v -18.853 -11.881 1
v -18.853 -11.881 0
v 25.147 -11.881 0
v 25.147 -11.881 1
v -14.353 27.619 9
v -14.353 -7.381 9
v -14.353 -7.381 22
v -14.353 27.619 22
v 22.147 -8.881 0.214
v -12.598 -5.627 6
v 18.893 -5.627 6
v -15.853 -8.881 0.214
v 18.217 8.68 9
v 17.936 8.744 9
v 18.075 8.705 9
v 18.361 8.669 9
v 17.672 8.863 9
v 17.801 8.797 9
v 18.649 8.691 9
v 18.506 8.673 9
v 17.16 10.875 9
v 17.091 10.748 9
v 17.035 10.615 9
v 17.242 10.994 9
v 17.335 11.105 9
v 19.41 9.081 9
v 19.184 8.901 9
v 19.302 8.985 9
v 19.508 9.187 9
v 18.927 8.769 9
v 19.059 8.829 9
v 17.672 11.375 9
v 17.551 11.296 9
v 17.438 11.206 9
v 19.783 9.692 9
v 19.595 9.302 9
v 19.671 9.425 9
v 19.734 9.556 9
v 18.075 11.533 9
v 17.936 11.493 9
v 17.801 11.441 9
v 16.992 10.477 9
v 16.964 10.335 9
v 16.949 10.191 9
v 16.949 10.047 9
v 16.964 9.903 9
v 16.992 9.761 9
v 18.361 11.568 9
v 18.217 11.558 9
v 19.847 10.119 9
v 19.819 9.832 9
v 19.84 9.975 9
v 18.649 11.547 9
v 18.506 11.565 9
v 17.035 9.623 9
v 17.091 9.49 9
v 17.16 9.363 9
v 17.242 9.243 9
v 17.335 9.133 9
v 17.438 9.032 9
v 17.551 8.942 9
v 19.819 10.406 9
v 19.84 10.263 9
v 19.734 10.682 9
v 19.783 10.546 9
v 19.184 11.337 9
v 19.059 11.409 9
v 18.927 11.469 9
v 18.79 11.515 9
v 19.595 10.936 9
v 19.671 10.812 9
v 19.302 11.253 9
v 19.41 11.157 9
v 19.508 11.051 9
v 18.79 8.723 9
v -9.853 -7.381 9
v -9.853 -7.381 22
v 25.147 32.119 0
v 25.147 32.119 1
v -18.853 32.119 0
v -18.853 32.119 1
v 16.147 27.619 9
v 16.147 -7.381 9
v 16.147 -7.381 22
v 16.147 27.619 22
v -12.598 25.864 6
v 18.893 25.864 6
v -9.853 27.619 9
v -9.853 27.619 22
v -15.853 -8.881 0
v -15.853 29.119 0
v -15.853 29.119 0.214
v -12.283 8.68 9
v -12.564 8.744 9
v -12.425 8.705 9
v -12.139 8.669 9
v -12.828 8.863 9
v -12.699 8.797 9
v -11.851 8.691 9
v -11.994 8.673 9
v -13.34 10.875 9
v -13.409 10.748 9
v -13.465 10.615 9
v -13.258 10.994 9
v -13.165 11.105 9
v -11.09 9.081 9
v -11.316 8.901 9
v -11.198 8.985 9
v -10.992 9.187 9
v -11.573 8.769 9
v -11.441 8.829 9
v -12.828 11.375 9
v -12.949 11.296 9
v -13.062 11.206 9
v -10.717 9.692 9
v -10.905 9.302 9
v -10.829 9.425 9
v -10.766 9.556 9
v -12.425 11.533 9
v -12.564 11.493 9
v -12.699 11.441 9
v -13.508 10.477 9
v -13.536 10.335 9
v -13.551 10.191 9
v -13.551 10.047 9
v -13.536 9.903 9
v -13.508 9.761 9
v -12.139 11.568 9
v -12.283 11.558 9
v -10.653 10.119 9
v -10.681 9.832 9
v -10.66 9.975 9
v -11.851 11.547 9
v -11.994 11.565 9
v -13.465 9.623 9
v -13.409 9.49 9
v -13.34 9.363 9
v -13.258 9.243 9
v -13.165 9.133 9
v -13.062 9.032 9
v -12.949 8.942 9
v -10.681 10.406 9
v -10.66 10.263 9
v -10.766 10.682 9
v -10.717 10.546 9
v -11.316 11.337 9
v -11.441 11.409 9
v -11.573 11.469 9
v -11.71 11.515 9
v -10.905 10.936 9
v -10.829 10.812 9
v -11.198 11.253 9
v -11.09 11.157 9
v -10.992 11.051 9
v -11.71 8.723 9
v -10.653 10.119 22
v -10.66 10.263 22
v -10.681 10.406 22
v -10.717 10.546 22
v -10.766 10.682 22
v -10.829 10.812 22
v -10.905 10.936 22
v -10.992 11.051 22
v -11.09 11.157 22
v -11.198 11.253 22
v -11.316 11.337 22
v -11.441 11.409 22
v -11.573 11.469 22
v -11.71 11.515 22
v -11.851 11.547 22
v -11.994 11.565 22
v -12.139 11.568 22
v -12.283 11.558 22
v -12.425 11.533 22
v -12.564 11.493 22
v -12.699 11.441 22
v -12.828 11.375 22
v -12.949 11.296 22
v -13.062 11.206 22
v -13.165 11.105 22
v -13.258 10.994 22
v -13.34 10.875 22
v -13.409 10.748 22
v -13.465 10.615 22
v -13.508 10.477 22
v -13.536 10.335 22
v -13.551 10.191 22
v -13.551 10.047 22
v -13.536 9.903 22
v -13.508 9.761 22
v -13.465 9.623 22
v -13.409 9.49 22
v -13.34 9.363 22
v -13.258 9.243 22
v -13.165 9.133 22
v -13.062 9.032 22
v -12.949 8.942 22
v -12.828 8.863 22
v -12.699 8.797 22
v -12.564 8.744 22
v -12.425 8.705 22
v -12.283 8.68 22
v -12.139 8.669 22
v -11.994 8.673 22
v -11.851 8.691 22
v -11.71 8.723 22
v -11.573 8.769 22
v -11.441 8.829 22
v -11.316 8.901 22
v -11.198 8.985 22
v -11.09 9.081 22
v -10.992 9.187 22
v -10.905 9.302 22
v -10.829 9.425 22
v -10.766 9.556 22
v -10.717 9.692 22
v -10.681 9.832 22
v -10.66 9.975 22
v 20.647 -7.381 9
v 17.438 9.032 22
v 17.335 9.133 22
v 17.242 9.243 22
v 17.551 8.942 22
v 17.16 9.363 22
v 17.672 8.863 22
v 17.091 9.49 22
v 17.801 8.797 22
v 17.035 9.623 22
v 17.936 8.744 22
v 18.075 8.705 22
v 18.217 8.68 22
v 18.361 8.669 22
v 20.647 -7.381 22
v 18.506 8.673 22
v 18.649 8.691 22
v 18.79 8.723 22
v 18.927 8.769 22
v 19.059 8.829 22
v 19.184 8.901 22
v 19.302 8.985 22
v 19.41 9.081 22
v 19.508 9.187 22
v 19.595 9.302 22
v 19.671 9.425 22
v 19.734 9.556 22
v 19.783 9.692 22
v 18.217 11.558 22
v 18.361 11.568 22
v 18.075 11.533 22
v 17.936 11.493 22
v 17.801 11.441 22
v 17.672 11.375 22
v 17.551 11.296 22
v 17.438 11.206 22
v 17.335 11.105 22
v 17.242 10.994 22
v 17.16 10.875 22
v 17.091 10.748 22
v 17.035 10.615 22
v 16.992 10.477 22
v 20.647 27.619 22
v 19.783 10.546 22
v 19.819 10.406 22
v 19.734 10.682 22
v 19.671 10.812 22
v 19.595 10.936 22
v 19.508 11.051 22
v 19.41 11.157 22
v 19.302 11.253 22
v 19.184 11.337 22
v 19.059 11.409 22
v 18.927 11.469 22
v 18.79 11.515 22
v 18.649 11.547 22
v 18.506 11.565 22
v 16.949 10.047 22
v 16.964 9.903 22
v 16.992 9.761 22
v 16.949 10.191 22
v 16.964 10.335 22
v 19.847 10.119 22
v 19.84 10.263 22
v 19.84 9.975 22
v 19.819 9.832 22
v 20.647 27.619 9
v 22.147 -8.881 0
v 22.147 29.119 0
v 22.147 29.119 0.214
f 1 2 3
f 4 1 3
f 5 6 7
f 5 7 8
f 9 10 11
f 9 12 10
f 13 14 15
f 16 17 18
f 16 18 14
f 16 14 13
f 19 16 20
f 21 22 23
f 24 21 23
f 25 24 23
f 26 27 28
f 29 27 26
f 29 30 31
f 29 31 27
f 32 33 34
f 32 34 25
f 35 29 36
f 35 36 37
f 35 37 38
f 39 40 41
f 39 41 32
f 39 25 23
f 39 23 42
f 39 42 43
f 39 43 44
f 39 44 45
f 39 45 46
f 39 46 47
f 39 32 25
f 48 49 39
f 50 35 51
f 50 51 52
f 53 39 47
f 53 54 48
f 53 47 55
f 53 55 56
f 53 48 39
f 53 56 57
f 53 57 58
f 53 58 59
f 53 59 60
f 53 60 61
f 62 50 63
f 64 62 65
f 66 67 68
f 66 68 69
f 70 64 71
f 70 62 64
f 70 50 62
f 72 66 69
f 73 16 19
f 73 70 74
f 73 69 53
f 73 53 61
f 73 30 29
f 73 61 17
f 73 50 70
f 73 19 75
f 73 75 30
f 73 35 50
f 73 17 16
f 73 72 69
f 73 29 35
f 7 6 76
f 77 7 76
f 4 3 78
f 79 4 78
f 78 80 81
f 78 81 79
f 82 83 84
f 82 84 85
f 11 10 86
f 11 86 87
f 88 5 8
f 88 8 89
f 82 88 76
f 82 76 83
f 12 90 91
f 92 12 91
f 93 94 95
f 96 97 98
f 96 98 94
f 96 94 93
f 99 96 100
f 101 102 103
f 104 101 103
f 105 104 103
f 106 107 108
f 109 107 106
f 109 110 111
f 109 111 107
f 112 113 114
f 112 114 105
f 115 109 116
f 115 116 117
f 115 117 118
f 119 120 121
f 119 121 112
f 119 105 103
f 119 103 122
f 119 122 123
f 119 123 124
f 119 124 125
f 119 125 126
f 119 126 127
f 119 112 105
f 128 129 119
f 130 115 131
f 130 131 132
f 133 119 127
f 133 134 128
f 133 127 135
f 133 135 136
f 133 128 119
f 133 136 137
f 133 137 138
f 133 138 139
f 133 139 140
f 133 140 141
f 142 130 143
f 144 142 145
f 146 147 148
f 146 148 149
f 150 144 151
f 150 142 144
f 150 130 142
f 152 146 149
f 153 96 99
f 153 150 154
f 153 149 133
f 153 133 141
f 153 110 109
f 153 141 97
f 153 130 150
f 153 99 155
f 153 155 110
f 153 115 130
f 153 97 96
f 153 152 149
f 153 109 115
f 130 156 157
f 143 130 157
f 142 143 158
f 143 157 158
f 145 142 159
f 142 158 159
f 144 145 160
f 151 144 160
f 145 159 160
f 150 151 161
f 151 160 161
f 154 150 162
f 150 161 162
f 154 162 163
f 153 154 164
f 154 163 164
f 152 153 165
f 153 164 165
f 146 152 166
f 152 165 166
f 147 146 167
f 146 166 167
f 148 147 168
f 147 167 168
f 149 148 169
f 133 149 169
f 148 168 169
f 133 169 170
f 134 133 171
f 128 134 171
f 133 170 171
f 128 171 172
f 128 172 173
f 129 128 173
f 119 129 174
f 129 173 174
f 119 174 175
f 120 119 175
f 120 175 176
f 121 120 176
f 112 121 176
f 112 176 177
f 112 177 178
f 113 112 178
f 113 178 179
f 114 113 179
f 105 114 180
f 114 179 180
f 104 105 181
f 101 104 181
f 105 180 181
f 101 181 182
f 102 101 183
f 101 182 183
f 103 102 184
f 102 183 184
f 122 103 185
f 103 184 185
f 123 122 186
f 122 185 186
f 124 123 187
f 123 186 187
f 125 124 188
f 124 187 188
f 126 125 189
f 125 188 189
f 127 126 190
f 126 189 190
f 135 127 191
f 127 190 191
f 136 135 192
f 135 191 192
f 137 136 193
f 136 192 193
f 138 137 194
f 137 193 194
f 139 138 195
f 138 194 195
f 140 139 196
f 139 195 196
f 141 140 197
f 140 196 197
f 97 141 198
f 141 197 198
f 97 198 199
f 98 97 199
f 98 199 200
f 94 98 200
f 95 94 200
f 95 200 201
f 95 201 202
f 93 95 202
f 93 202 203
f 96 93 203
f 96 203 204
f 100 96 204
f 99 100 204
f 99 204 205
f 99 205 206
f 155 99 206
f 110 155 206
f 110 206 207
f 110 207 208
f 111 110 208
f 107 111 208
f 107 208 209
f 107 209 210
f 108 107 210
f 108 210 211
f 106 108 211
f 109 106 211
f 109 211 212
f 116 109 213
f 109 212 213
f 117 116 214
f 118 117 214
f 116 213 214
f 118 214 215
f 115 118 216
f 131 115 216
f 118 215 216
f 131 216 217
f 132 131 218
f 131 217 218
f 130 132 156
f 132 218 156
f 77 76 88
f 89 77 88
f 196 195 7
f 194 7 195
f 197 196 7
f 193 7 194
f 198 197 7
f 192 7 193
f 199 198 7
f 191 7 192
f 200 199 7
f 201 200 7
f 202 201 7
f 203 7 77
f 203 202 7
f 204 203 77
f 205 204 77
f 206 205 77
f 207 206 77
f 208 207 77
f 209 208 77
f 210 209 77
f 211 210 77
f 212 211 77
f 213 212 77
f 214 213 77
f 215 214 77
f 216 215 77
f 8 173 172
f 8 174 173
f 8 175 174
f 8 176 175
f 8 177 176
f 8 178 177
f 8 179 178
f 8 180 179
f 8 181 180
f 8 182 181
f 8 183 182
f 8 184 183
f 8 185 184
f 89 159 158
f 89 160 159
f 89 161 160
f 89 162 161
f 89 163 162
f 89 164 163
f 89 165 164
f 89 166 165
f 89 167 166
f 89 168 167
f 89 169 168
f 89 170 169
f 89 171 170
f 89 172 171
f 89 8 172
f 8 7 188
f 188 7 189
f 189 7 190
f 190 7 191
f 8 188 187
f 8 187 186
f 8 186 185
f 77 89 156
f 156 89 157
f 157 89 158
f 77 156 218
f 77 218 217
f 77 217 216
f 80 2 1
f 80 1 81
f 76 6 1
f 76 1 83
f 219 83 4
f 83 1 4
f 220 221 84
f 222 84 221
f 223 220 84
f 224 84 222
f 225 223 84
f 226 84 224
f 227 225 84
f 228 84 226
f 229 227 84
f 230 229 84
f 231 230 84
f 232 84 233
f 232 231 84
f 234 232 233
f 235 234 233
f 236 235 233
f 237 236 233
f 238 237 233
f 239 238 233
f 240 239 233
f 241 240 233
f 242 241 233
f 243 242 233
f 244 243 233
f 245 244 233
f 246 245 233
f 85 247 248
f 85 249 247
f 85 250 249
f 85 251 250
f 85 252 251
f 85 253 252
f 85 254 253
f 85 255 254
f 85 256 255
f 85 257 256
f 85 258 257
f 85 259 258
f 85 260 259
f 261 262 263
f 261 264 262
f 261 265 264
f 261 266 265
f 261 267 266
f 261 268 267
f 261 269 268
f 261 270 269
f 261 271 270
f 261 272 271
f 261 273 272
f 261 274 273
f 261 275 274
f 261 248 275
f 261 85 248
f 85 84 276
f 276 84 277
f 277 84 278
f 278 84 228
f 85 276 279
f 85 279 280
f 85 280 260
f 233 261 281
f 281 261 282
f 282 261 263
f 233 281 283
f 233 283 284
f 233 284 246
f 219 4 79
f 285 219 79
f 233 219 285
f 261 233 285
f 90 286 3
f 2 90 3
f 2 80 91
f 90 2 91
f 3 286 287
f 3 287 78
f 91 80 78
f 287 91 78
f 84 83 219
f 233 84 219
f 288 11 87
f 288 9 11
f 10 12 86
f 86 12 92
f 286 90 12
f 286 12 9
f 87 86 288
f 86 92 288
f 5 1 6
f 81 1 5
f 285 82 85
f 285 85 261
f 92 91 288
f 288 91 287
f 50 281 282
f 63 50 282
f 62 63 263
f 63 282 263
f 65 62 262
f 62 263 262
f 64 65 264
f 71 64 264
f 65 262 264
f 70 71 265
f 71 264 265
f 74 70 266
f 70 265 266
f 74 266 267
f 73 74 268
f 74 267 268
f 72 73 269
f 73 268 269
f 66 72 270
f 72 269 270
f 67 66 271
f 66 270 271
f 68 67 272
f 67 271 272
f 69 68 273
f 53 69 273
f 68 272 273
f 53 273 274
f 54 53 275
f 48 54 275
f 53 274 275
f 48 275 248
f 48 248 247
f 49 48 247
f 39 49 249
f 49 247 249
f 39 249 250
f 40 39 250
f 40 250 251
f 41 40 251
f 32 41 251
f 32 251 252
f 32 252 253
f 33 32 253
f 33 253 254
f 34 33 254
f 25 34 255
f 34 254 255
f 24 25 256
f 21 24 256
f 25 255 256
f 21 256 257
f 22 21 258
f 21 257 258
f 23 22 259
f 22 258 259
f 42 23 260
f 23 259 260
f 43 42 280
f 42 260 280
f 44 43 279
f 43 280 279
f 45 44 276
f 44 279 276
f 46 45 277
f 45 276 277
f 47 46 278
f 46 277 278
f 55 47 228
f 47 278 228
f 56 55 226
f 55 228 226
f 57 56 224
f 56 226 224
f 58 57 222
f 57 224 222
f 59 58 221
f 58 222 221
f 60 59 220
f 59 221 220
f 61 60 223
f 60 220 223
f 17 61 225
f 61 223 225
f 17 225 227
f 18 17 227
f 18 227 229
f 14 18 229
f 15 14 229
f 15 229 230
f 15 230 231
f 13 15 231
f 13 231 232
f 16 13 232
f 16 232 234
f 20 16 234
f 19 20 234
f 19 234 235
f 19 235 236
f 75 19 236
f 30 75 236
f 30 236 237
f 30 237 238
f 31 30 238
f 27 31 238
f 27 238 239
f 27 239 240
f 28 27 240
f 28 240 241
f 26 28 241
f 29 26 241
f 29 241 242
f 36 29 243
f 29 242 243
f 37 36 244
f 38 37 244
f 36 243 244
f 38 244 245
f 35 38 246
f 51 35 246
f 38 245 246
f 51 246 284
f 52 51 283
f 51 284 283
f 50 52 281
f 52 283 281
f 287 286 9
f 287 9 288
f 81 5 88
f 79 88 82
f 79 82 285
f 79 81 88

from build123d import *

# Parameters (mm, degrees)
F0_W     = 44
F0_H     = 44
F1_DEPTH = 9
F2_SIZE2 = 8
F2_SIZE  = 4.5
F4_T     = -3
F5_W     = 4.5
F5_H     = 35
F6_DEPTH = 13
F7_R     = 1.45
F8_DEPTH = 13


with BuildPart() as f1:
    # F0 (on Top) → F1 (new body)
    with BuildSketch(Plane.XY):
        with Locations((3.1474529505, 10.1189251319)):
            Rectangle(F0_W, F0_H)
    extrude(amount=F1_DEPTH)

    # F2
    f2_edges = [f1.edges().sort_by_distance(p)[0] for p in [
        (3.147453, -11.881075, 9),
        (-18.852547, 10.118925, 9),
        (3.147453, 32.118925, 9),
        (25.147453, 10.118925, 9),
    ]]
    f2_side = f1.faces().sort_by_distance((3.147453, 10.118925, 9))[0]
    chamfer(f2_edges, length=F2_SIZE, length2=F2_SIZE2, reference=f2_side)

    # F4
    f4_openings = [f1.faces().sort_by_distance(p)[0] for p in [
        (3.147453, 10.118925, 0),
    ]]
    offset(amount=F4_T, openings=f4_openings)

    # F5 (on face) → F6 (join)
    with BuildSketch(Plane.XY.offset(9)):
        with Locations((18.3974529505, 10.1189251319)):
            Rectangle(F5_W, F5_H)
        with Locations((-12.1025470495, 10.1189251319)):
            Rectangle(F5_W, F5_H)
    extrude(amount=F6_DEPTH)

    # F7 (on face) → F8 (cut)
    with BuildSketch(Plane.XY.offset(22)):
        with Locations((-12.1025470495, 10.1189251319)):
            Circle(F7_R)
        with Locations((18.3974529505, 10.1189251319)):
            Circle(F7_R)
    extrude(amount=-F8_DEPTH, mode=Mode.SUBTRACT)


solid = f1.part
